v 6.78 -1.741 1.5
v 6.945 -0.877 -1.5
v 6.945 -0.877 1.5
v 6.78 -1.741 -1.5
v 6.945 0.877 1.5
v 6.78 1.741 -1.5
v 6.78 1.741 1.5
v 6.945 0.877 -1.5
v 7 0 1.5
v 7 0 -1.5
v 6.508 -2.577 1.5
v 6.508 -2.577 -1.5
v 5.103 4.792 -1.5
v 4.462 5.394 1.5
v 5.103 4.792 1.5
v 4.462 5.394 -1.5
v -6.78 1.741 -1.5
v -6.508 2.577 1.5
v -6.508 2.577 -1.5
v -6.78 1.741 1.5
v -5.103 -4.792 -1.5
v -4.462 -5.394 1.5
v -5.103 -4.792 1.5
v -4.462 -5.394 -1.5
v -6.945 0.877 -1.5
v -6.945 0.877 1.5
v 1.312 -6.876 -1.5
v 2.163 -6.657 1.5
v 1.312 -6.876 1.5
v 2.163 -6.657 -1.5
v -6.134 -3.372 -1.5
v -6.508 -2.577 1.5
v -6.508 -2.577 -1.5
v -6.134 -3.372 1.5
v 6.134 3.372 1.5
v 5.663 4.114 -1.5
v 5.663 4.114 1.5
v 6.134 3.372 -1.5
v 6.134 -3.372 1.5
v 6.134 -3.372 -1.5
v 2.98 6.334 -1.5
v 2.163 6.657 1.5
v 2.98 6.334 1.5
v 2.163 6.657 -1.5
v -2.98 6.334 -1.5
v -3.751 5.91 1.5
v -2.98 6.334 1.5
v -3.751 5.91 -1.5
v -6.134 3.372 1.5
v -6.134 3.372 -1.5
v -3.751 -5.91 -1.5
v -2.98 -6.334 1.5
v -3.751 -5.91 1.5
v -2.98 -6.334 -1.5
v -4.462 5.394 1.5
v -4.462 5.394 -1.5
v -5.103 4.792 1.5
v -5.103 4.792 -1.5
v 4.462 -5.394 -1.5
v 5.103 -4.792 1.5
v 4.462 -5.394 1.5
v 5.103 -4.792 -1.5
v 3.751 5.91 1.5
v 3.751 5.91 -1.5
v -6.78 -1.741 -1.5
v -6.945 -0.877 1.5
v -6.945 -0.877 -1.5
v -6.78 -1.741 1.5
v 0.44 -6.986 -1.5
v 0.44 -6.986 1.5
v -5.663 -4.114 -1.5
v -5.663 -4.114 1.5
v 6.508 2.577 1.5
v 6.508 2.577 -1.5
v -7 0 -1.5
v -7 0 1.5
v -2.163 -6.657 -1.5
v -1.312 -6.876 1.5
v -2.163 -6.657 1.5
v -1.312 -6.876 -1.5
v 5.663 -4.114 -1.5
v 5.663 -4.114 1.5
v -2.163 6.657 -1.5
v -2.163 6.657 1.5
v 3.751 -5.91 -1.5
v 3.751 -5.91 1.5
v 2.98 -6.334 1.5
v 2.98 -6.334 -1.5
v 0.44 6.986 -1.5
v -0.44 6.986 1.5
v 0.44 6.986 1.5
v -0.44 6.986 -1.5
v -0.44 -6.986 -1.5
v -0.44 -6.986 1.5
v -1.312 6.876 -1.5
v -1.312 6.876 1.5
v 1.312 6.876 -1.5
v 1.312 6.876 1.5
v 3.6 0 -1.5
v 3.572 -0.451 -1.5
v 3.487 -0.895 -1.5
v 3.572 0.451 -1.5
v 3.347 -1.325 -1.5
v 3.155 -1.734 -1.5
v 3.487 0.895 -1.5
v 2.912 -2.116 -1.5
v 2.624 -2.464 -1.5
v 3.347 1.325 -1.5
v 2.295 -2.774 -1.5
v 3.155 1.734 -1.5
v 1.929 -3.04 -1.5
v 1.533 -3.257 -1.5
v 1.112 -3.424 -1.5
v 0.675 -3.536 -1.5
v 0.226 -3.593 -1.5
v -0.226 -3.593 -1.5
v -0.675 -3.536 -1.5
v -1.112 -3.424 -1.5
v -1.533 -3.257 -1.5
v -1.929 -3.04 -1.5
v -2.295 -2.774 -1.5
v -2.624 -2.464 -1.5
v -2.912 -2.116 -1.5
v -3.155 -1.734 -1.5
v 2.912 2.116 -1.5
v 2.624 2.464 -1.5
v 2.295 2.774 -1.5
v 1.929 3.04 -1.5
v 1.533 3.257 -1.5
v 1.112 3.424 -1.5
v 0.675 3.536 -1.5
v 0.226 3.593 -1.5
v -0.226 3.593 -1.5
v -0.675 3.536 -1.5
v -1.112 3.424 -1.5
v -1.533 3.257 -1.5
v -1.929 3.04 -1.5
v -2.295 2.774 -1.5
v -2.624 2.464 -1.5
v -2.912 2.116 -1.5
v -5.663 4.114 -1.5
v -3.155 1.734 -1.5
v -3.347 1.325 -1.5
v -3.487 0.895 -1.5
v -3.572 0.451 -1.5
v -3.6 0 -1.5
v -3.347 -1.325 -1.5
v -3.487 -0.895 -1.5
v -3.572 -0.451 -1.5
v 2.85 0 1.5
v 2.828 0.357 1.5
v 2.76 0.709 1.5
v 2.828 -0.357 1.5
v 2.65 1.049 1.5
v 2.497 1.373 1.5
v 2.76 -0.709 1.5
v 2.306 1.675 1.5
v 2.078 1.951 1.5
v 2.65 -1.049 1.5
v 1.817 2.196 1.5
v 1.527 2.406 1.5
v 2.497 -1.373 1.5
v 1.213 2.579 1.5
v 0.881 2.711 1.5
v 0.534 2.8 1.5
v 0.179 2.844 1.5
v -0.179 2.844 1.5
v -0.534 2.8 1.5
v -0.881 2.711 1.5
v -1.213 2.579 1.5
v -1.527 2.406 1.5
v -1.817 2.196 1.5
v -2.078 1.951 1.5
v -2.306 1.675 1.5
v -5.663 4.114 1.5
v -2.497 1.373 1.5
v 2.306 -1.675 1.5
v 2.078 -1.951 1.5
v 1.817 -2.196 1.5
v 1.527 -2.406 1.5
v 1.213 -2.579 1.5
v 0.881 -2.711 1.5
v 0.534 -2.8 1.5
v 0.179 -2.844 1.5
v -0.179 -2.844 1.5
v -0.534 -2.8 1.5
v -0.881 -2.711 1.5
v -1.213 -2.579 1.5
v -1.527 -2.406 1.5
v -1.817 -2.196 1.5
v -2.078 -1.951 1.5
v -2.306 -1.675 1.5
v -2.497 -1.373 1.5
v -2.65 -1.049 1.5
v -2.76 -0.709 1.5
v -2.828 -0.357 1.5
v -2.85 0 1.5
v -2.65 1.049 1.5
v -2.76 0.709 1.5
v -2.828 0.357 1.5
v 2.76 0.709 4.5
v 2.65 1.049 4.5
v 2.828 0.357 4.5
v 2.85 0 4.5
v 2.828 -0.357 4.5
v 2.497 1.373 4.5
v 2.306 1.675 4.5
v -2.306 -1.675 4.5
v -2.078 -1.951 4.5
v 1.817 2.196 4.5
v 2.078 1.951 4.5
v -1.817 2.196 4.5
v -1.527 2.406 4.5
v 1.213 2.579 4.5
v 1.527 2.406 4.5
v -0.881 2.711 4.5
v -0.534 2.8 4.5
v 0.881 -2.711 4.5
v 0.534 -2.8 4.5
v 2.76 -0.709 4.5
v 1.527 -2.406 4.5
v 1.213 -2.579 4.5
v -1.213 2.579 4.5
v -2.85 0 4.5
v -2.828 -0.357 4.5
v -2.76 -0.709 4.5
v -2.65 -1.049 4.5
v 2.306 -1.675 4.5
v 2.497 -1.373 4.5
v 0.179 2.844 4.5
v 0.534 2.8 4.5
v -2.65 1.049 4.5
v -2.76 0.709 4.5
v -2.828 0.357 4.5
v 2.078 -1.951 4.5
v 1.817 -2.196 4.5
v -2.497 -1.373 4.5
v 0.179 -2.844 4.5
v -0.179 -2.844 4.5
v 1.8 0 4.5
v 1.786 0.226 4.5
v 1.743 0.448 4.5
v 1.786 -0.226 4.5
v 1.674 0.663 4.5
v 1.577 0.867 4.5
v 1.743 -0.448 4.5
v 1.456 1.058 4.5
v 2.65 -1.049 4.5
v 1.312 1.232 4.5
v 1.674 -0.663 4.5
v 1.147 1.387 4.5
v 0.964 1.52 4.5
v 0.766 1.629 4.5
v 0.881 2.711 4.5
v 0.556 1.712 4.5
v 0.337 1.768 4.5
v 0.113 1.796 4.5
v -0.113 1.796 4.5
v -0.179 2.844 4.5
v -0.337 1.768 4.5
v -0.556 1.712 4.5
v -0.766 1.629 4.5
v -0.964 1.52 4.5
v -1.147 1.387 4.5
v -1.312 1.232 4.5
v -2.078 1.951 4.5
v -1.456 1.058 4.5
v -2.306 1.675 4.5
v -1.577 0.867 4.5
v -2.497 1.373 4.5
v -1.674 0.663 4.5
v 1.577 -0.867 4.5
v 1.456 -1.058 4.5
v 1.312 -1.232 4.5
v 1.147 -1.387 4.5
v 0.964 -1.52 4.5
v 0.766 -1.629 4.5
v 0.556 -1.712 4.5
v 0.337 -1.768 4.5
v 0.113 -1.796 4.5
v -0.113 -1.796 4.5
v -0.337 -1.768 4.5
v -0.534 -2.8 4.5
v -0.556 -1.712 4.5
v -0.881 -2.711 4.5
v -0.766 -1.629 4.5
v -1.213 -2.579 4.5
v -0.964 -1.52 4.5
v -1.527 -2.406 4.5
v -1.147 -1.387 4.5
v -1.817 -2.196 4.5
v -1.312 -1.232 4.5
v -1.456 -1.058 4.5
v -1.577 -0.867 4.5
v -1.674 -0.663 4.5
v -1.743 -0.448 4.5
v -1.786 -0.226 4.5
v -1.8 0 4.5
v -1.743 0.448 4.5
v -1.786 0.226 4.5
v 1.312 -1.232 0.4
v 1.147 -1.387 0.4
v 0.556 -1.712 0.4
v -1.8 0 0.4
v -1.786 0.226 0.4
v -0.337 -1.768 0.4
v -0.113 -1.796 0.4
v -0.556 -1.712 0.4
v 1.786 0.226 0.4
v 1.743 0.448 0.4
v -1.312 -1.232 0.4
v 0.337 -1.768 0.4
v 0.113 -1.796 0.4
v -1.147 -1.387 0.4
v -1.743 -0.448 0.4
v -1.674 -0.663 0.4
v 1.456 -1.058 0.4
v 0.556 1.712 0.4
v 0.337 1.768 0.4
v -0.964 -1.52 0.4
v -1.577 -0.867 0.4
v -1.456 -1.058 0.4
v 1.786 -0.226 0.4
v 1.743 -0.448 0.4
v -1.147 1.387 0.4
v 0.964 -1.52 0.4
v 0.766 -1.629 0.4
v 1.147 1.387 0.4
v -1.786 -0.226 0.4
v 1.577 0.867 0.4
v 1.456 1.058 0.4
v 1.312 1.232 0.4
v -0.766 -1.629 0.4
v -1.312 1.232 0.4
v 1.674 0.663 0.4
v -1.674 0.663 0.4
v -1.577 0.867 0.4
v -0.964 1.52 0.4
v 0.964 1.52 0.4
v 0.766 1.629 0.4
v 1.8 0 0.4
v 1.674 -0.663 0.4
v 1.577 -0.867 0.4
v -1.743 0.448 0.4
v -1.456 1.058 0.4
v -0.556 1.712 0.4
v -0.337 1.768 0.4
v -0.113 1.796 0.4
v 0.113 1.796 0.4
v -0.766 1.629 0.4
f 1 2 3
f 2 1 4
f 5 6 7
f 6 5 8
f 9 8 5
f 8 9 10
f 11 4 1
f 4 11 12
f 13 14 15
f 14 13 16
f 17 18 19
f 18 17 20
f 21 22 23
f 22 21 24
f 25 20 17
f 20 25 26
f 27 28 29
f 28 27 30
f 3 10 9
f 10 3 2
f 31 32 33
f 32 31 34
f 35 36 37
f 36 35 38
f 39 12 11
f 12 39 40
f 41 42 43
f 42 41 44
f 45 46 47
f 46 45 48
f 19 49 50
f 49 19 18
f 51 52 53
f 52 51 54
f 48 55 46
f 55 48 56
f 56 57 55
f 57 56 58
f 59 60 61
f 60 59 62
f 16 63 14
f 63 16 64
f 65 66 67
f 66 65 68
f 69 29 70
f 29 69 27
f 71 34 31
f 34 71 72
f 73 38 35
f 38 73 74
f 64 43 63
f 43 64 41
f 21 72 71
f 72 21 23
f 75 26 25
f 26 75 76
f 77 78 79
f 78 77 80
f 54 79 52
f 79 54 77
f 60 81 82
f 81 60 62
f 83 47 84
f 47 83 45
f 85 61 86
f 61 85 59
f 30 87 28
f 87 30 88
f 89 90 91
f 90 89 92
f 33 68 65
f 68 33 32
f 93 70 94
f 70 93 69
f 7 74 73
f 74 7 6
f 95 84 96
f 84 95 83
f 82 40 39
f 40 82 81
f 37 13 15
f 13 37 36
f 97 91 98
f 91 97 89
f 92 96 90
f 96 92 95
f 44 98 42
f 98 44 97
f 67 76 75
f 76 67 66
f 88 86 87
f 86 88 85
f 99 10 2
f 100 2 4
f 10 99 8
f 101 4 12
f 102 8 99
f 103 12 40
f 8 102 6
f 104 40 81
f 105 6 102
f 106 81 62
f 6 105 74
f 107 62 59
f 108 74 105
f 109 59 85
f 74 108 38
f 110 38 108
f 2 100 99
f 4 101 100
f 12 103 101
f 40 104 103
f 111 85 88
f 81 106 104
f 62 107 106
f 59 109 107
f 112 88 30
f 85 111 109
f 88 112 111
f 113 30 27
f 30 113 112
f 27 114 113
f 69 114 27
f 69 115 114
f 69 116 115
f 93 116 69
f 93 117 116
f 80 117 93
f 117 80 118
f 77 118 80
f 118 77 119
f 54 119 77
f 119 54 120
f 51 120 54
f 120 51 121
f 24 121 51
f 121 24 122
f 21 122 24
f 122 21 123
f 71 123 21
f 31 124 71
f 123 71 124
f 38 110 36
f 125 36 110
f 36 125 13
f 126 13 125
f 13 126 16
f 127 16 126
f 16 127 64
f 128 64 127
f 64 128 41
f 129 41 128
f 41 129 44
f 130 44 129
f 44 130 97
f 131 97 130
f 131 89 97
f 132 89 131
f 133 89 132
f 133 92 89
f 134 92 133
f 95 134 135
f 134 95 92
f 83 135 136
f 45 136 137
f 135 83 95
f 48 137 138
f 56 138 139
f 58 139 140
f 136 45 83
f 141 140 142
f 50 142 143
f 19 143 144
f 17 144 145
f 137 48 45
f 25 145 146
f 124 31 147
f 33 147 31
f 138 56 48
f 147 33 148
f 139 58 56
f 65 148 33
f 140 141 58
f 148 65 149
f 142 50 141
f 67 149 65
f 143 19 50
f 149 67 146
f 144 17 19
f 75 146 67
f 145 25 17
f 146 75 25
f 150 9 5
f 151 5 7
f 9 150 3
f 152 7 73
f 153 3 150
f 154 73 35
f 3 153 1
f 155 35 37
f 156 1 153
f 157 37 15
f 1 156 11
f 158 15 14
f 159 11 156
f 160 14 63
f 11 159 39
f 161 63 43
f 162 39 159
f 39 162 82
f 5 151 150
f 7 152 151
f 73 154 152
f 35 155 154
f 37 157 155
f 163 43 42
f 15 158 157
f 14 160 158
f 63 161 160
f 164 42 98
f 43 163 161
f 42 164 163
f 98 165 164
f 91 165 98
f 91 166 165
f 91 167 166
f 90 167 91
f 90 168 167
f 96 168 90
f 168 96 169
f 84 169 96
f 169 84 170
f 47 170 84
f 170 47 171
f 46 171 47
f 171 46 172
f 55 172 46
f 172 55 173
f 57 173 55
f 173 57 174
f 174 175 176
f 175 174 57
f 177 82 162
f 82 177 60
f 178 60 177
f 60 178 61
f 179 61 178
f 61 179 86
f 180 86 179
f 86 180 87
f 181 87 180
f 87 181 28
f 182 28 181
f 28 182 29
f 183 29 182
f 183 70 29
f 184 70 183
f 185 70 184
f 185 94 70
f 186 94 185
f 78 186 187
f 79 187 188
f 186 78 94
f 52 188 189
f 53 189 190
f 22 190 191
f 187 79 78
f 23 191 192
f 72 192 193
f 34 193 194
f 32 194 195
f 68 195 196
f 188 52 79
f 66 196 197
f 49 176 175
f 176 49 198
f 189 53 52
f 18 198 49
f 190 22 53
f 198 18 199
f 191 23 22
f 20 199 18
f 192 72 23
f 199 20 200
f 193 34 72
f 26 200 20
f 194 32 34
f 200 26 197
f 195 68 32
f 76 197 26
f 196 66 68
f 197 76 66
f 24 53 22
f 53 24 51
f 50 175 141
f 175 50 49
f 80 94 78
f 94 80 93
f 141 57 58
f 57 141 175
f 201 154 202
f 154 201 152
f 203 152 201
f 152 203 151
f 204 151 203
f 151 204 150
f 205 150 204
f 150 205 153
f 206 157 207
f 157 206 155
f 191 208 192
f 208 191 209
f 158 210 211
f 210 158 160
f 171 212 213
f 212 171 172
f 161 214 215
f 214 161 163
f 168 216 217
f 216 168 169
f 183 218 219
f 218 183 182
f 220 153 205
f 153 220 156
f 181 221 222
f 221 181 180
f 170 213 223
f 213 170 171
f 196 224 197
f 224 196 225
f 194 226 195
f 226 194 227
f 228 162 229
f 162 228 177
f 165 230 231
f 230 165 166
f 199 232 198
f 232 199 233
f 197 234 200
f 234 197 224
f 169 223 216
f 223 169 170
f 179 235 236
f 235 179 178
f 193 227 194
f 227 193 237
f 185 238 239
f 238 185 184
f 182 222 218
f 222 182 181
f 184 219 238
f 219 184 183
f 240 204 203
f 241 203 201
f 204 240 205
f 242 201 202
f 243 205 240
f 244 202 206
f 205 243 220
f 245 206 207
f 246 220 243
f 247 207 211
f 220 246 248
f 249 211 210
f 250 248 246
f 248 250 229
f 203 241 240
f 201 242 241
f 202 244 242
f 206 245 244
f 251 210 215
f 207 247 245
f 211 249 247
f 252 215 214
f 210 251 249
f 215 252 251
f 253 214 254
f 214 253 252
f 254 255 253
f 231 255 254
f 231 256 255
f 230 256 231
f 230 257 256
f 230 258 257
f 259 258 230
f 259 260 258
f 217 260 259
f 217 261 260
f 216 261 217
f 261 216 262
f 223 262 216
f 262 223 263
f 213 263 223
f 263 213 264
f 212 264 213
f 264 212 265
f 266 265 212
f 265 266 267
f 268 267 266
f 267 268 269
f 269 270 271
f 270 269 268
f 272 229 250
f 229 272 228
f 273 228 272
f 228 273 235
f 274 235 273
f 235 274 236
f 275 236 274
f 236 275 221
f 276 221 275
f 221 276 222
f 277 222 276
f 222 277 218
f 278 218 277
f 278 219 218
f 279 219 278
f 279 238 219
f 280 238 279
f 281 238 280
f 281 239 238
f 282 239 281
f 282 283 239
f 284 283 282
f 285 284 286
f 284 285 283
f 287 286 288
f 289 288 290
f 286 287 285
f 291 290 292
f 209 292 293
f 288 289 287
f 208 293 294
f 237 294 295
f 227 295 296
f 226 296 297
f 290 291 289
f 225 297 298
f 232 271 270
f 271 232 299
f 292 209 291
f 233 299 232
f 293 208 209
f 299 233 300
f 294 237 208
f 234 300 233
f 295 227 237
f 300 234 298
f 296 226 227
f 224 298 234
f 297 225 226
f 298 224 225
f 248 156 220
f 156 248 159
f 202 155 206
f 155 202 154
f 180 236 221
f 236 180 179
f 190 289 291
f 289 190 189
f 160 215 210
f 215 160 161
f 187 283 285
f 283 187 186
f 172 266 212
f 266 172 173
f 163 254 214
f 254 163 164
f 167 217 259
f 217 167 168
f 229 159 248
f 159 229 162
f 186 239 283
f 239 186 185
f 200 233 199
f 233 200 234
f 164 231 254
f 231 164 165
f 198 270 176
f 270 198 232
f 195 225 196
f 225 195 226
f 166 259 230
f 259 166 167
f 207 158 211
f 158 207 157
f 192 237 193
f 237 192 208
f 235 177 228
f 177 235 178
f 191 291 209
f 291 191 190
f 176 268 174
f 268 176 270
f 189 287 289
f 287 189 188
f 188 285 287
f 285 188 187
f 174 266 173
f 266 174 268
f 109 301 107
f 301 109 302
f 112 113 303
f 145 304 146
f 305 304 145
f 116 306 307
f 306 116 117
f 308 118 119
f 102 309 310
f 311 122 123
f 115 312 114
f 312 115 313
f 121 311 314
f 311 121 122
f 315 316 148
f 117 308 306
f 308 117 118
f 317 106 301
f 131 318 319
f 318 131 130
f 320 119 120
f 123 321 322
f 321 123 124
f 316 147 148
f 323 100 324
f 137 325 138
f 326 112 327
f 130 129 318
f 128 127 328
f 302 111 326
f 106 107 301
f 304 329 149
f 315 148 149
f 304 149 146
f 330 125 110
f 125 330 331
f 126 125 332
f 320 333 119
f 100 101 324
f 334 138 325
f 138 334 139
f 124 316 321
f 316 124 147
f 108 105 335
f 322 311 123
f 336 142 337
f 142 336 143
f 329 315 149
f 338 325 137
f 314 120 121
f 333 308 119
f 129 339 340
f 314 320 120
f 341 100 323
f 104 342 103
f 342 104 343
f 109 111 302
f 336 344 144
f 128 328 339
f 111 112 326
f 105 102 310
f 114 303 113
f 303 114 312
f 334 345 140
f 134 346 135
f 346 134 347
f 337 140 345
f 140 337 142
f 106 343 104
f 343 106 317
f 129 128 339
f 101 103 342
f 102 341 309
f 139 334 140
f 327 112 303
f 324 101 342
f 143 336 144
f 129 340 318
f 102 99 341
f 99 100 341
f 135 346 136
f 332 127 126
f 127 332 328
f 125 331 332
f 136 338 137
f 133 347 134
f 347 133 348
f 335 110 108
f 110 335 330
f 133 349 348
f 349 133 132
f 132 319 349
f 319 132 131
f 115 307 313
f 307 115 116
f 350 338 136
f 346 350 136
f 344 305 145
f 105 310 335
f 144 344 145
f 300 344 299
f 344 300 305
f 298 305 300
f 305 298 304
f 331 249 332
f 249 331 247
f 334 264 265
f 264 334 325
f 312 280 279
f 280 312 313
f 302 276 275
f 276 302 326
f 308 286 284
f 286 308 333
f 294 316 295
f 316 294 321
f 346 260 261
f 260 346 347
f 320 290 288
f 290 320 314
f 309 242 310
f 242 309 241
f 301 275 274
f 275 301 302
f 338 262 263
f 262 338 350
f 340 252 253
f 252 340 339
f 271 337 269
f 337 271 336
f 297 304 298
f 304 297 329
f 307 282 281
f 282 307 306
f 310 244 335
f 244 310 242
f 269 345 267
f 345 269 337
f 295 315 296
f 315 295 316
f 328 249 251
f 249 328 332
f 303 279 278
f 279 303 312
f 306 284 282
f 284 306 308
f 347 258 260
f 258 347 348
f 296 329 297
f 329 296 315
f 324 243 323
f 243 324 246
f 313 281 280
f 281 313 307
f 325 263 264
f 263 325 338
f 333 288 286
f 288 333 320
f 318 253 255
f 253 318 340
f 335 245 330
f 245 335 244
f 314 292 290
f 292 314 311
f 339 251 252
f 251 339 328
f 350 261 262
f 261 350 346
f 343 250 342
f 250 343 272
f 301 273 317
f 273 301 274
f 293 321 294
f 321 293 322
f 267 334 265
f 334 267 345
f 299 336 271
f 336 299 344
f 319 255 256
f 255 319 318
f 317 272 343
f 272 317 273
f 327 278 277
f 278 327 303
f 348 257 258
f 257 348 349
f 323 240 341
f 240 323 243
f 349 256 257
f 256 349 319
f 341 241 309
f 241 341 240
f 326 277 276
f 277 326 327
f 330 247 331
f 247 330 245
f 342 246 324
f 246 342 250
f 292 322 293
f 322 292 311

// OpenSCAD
$fn = 50;


difference() {
	union() {
		translate(v = [0, 0, -1.5000000000]) {
			cylinder(h = 3, r = 7.0000000000);
		}
		translate(v = [0, 0, -1.5000000000]) {
			cylinder(h = 6, r = 2.8500000000);
		}
	}
	union() {
		translate(v = [0, 0, -1.5000000000]) {
			rotate(a = [0, 180, 0]) {
				difference() {
					union() {
						translate(v = [0, 0, -6.0000000000]) {
							cylinder(h = 6, r = 1.5000000000);
						}
						translate(v = [0, 0, -1.9000000000]) {
							cylinder(h = 1.9000000000, r1 = 1.8000000000, r2 = 3.6000000000);
						}
						translate(v = [0, 0, -6.0000000000]) {
							cylinder(h = 6, r = 1.8000000000);
						}
						translate(v = [0, 0, -6.0000000000]) {
							cylinder(h = 6, r = 1.5000000000);
						}
					}
					union();
				}
			}
		}
		translate(v = [0, 0, -50.0000000000]) {
			cylinder(h = 100, r = 1.8000000000);
		}
	}
}
